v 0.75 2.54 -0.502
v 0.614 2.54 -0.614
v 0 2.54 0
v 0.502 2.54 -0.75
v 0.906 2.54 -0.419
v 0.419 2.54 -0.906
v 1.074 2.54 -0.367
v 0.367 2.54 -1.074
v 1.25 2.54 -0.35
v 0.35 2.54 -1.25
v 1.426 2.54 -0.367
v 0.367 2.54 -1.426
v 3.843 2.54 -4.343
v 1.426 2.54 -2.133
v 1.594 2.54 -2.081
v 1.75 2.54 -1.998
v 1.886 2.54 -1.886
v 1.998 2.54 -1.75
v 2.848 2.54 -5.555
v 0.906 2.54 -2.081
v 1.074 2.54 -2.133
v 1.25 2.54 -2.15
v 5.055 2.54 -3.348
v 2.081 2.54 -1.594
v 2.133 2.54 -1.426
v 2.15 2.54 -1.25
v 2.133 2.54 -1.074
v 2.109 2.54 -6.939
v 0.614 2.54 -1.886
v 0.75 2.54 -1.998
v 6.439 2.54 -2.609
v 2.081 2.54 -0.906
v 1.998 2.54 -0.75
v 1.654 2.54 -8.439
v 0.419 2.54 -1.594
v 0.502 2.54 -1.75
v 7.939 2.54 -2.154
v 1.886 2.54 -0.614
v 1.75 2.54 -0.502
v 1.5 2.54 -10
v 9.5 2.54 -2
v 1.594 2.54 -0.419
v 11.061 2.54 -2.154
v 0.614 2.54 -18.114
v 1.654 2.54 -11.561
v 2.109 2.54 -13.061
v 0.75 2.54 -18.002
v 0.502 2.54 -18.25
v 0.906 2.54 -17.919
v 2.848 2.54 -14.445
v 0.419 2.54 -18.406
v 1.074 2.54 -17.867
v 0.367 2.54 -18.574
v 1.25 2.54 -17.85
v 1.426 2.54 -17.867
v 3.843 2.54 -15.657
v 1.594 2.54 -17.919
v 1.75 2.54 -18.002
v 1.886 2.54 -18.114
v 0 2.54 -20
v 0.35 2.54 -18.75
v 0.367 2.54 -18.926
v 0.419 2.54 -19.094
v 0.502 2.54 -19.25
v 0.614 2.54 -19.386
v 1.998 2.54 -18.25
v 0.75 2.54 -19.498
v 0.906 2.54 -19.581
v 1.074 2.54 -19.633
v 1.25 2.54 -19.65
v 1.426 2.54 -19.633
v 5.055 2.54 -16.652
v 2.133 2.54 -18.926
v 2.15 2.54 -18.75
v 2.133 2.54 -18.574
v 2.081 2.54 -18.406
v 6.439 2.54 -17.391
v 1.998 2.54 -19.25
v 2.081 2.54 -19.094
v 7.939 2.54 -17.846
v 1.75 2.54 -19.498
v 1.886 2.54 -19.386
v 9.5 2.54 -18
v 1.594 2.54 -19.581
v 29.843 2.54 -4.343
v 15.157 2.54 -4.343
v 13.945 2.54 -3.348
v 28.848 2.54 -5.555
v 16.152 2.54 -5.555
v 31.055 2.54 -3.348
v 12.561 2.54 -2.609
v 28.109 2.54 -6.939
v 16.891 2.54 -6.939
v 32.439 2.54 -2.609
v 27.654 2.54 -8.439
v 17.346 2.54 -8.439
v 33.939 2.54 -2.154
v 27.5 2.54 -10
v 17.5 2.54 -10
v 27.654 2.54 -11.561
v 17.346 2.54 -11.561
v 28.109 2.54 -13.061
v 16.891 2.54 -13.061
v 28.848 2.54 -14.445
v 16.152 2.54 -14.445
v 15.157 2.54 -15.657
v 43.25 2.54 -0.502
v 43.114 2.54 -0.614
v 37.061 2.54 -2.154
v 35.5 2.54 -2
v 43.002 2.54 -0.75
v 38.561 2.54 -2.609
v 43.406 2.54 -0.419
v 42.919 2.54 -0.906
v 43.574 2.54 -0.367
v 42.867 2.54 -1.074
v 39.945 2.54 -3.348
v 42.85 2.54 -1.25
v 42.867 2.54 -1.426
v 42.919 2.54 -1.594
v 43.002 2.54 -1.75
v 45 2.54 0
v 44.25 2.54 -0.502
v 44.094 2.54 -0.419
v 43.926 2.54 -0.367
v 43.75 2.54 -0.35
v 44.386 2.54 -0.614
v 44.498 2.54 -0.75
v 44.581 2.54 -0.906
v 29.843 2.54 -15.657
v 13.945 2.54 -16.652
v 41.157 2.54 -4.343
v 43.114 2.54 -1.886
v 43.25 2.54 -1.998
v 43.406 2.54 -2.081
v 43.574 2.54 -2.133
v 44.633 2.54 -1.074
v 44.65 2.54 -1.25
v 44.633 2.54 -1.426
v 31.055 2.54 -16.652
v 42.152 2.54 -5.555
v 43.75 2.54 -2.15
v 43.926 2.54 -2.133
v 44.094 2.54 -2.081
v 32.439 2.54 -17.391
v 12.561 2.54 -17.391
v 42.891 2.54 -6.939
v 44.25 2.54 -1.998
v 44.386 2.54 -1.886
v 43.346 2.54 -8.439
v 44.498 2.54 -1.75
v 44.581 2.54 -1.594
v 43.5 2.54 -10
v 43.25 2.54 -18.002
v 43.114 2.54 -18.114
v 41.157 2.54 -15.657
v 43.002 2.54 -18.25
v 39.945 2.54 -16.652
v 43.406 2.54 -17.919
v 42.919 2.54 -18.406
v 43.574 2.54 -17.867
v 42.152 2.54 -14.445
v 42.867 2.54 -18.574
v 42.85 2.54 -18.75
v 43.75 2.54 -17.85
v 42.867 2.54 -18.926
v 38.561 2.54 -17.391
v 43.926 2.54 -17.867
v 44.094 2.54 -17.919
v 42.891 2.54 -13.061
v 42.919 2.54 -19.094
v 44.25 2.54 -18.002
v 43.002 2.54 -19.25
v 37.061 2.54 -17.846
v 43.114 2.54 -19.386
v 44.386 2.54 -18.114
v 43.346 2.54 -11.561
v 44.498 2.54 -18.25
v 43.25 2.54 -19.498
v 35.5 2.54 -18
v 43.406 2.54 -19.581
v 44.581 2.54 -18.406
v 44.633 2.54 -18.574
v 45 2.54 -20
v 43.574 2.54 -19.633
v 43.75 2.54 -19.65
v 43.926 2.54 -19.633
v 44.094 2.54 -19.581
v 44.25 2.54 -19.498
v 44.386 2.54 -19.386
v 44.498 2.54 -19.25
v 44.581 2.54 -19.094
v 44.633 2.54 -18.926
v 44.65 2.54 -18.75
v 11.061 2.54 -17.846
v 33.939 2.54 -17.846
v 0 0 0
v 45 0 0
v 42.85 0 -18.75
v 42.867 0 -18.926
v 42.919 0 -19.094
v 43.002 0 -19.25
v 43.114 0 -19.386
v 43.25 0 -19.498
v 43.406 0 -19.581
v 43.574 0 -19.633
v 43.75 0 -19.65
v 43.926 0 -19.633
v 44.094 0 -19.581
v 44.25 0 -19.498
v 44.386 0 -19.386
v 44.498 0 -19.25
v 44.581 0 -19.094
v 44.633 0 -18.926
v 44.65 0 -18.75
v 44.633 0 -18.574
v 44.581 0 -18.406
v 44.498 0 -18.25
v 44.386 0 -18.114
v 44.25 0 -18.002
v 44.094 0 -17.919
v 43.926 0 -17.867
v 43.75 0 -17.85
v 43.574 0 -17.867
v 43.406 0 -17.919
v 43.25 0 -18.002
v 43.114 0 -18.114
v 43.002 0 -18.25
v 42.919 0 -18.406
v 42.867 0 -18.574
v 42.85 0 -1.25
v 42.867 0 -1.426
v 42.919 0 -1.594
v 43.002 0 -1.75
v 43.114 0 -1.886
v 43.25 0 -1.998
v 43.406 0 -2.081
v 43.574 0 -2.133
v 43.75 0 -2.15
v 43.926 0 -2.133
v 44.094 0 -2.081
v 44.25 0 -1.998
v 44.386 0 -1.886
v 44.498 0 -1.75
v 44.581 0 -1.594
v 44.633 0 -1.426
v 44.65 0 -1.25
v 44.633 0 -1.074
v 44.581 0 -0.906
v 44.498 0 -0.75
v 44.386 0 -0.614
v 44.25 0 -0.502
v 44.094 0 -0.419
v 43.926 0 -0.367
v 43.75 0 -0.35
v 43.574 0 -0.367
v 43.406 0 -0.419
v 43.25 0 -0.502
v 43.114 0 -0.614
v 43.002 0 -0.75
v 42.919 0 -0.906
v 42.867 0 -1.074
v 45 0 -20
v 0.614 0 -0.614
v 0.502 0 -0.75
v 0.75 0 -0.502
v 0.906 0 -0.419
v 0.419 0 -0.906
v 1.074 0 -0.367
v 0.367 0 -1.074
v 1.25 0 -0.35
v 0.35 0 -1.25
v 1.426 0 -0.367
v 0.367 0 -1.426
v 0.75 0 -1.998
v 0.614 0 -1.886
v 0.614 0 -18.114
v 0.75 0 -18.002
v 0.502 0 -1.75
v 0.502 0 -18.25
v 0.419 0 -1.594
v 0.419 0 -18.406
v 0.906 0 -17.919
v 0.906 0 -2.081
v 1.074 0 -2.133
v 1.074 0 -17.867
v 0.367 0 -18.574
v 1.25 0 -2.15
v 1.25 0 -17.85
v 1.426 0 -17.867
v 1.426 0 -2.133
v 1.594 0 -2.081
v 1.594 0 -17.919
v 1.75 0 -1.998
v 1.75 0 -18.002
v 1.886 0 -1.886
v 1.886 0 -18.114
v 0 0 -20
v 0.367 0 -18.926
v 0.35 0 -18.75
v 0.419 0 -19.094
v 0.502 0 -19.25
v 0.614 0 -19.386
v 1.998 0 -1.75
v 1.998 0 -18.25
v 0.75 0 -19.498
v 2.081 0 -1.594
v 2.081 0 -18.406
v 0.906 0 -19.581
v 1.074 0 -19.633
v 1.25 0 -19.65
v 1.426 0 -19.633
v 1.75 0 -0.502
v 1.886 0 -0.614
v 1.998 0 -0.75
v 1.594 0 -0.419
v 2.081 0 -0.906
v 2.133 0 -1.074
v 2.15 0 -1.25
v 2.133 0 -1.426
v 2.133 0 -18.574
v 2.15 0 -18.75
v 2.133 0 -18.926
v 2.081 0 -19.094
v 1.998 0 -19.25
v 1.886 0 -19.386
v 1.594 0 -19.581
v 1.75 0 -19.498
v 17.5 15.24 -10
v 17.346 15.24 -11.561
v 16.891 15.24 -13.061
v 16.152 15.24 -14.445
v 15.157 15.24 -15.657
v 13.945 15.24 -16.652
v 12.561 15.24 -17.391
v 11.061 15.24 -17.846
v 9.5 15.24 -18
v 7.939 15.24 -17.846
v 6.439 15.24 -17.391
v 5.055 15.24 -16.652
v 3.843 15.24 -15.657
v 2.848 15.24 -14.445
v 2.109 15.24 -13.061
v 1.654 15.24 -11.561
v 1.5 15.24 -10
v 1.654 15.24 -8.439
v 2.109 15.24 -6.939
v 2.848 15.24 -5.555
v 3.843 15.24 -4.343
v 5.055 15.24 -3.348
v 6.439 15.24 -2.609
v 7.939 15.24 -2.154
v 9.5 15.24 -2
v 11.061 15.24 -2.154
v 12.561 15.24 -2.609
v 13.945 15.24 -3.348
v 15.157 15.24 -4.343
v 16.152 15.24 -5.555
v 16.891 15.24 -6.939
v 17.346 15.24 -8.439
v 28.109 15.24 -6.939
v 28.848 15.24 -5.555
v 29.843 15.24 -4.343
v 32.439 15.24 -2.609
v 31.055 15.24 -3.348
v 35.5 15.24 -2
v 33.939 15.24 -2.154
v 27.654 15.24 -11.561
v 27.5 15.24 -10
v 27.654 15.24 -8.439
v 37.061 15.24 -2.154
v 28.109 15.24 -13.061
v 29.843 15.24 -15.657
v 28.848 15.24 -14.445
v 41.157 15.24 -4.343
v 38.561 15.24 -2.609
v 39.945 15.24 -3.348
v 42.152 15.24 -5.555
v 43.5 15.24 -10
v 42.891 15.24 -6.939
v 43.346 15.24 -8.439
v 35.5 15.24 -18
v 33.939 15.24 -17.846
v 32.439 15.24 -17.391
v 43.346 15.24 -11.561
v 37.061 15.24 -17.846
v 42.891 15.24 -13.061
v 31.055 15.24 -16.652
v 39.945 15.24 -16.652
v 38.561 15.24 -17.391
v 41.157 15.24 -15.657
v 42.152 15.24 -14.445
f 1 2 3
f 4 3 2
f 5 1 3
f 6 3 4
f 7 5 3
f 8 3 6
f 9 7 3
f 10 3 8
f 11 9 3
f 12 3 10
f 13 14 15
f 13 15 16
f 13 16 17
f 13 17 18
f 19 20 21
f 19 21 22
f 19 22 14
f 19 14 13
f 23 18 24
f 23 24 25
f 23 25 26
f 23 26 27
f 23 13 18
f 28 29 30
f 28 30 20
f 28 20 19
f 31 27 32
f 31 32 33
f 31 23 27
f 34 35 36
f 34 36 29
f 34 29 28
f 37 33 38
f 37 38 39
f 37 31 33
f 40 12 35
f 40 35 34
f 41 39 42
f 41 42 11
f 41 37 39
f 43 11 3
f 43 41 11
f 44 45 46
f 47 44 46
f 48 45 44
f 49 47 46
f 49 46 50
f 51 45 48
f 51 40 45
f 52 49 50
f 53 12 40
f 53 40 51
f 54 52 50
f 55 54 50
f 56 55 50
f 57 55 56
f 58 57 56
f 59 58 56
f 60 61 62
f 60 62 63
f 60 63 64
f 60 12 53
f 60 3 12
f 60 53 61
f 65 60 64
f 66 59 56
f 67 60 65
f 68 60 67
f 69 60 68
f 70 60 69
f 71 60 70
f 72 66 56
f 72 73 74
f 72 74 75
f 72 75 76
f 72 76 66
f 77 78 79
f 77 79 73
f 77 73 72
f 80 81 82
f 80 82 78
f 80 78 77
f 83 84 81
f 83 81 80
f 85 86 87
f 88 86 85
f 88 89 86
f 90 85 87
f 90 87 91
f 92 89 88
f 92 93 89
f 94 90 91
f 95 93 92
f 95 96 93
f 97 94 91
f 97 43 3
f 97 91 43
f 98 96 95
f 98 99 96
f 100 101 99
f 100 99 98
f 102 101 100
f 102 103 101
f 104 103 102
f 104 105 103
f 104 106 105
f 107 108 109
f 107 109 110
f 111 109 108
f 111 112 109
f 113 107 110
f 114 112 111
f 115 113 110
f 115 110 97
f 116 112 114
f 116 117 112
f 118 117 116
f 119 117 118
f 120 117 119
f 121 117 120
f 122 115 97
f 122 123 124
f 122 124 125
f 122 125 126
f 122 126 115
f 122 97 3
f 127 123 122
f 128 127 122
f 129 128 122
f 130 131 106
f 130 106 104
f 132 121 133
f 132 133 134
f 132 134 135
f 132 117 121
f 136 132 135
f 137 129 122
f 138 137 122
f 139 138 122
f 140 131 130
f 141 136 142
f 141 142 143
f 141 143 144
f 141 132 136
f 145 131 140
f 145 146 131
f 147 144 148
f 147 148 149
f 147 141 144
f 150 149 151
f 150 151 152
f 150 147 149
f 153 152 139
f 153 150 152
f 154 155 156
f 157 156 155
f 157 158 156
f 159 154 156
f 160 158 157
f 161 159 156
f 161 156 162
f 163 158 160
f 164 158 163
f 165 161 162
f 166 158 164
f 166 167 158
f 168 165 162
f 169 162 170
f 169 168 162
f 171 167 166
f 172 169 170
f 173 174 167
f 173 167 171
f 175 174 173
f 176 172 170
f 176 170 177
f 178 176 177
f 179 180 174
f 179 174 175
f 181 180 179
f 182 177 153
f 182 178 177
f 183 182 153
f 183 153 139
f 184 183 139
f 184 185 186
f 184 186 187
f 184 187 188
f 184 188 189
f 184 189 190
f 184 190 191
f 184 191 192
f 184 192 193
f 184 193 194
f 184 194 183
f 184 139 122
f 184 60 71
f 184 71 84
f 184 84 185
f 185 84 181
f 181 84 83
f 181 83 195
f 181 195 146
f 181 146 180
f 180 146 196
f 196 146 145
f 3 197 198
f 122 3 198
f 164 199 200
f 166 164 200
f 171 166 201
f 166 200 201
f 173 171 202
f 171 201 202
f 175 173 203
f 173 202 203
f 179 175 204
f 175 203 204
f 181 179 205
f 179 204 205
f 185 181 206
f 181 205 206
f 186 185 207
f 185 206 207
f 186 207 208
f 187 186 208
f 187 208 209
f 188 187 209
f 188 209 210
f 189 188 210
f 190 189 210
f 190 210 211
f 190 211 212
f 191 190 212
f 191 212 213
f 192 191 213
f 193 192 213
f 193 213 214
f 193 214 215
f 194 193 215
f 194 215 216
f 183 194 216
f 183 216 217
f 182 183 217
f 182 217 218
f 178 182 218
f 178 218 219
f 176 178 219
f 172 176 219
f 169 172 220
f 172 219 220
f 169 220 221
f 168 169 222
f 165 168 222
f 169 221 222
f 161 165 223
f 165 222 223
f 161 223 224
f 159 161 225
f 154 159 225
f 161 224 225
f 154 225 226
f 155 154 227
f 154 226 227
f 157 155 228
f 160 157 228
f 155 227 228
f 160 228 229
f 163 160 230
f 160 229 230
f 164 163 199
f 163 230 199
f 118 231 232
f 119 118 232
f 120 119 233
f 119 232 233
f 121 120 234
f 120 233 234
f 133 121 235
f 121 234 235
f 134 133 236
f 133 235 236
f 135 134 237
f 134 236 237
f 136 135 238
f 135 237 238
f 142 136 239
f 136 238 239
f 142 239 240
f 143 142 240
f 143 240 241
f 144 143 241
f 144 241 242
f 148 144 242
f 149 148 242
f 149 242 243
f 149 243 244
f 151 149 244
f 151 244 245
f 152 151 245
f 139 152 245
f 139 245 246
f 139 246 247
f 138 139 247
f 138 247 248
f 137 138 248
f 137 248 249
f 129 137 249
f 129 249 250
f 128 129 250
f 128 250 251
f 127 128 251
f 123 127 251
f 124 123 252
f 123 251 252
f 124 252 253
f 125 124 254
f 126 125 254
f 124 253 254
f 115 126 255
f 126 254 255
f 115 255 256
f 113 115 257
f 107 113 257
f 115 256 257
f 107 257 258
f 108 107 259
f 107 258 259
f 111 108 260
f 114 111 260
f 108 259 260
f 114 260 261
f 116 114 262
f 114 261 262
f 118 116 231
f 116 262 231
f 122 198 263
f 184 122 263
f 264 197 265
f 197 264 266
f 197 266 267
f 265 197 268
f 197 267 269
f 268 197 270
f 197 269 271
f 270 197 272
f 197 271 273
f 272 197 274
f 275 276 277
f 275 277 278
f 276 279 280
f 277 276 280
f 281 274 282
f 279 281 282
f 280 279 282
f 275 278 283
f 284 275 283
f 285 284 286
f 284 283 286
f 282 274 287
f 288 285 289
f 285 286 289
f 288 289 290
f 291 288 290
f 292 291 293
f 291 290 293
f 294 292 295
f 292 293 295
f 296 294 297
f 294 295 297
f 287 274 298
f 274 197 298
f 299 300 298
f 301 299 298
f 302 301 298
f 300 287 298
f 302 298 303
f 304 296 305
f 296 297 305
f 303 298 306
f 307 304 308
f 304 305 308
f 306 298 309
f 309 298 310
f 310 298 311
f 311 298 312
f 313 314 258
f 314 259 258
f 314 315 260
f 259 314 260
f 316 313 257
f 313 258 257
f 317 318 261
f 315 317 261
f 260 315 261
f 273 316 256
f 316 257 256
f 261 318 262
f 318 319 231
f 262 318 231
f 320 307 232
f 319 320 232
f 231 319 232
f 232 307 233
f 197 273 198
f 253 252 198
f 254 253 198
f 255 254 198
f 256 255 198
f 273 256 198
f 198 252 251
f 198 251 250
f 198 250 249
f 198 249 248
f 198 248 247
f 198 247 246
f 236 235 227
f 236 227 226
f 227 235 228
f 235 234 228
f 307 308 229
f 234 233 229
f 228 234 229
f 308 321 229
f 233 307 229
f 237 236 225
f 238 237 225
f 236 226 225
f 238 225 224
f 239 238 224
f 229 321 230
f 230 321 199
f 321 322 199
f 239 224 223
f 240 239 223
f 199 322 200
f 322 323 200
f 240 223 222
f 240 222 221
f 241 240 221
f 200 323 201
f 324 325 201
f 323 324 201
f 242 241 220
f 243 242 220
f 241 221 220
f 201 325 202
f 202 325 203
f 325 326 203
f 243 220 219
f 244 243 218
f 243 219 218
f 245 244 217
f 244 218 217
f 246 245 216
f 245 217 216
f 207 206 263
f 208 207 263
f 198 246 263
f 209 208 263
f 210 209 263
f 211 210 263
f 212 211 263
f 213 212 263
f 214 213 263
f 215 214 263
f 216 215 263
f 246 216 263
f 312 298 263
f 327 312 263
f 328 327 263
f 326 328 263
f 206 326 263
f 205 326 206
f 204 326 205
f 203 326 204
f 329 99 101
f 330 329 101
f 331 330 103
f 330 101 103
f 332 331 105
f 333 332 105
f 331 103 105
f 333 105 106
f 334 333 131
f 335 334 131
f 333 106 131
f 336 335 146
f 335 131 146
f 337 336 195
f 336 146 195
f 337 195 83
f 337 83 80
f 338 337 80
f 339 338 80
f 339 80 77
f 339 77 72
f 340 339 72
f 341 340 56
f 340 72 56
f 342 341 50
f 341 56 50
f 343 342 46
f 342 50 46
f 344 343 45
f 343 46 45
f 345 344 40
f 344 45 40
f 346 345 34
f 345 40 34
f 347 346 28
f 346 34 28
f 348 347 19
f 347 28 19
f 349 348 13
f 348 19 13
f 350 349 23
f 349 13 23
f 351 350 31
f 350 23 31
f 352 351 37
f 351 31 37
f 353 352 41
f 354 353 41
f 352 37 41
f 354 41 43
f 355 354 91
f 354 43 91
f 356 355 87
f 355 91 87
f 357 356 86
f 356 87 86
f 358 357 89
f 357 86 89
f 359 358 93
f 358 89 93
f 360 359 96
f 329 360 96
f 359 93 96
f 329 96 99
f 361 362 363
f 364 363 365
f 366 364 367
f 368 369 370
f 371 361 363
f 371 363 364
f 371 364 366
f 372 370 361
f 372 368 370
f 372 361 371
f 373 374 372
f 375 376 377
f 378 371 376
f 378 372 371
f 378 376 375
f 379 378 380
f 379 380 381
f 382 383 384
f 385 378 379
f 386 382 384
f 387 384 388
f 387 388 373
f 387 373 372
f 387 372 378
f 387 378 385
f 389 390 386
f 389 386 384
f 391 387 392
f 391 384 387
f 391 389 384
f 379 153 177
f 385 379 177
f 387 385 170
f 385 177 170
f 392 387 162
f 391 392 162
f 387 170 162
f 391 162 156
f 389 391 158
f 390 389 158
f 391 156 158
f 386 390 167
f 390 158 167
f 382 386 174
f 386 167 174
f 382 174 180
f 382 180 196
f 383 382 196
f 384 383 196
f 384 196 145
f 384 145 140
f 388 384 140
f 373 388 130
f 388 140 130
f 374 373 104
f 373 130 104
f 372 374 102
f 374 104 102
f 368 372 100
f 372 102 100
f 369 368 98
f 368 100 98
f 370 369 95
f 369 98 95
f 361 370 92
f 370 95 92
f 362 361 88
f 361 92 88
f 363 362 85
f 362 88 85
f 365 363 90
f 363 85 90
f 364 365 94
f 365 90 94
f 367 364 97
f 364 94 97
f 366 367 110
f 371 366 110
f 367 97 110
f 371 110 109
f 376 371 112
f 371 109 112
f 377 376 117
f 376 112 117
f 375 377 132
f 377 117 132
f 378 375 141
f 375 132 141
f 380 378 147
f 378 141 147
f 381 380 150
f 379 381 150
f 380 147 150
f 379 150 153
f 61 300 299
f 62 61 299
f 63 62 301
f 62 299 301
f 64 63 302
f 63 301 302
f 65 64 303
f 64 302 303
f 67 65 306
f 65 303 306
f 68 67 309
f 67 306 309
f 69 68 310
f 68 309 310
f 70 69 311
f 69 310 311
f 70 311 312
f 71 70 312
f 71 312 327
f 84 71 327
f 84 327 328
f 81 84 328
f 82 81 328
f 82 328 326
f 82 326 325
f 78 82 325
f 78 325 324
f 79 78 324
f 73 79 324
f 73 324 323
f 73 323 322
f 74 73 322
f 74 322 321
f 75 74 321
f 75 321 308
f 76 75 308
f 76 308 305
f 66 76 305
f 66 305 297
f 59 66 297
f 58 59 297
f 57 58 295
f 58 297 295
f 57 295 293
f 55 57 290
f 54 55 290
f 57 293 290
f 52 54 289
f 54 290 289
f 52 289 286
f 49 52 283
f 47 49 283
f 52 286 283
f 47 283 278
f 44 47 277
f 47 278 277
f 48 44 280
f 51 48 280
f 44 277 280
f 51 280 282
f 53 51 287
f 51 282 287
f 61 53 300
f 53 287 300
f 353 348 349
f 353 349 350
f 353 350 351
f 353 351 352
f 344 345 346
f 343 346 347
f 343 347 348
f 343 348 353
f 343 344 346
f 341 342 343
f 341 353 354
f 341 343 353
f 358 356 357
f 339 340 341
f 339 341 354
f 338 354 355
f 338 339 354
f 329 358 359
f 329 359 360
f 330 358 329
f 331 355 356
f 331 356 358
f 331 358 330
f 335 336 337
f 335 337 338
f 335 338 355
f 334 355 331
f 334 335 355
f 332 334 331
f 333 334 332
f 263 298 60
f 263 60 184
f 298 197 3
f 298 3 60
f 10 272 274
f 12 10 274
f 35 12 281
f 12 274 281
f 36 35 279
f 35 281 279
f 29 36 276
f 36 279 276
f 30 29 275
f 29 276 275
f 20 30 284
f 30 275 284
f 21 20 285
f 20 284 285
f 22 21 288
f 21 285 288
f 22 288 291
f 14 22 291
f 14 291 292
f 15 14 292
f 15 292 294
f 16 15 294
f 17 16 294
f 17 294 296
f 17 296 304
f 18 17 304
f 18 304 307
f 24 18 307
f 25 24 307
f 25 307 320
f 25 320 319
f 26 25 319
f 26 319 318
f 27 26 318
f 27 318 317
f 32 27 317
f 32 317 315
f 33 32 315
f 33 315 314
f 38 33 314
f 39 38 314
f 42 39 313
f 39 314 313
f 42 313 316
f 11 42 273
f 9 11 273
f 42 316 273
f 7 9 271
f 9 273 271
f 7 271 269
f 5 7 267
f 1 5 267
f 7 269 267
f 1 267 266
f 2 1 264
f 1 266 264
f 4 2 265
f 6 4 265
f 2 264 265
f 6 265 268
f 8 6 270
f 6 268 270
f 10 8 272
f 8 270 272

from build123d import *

# Parameters (mm, degrees)
SKETCH2_W              = 45
SKETCH2_H              = 20
BOSS_EXTRUDE1_DEPTH    = 2.54
M1_6_CLEARANCE_HOLE1_D = 1.8
SKETCH6_R              = 8
BOSS_EXTRUDE2_DEPTH    = 12.7


with BuildPart() as part:
    # Sketch2 → Boss-Extrude1 (new body)
    with BuildSketch(Plane(origin=(0, 0, 0), x_dir=(1, 0, 0), z_dir=(0, 1, 0))):
        with Locations((22.5, 10)):
            Rectangle(SKETCH2_W, SKETCH2_H)
    extrude(amount=BOSS_EXTRUDE1_DEPTH)

    # M1.6 Clearance Hole1 (through all)
    with Locations(Plane(origin=(0, 2.54, 0), x_dir=(1, 0, 0), z_dir=(0, 1, 0))):
        with Locations((43.75, 18.75), (1.25, 18.75), (1.25, 1.25), (43.75, 1.25)):
            Hole(M1_6_CLEARANCE_HOLE1_D / 2)

    # Sketch6 → Boss-Extrude2 (add)
    with BuildSketch(Plane(origin=(0, 2.54, 0), x_dir=(1, 0, 0), z_dir=(0, 1, 0))):
        with Locations((9.5, 10)):
            Circle(SKETCH6_R)
        with Locations((35.5, 10)):
            Circle(SKETCH6_R)
    extrude(amount=BOSS_EXTRUDE2_DEPTH)


solid = part.part
